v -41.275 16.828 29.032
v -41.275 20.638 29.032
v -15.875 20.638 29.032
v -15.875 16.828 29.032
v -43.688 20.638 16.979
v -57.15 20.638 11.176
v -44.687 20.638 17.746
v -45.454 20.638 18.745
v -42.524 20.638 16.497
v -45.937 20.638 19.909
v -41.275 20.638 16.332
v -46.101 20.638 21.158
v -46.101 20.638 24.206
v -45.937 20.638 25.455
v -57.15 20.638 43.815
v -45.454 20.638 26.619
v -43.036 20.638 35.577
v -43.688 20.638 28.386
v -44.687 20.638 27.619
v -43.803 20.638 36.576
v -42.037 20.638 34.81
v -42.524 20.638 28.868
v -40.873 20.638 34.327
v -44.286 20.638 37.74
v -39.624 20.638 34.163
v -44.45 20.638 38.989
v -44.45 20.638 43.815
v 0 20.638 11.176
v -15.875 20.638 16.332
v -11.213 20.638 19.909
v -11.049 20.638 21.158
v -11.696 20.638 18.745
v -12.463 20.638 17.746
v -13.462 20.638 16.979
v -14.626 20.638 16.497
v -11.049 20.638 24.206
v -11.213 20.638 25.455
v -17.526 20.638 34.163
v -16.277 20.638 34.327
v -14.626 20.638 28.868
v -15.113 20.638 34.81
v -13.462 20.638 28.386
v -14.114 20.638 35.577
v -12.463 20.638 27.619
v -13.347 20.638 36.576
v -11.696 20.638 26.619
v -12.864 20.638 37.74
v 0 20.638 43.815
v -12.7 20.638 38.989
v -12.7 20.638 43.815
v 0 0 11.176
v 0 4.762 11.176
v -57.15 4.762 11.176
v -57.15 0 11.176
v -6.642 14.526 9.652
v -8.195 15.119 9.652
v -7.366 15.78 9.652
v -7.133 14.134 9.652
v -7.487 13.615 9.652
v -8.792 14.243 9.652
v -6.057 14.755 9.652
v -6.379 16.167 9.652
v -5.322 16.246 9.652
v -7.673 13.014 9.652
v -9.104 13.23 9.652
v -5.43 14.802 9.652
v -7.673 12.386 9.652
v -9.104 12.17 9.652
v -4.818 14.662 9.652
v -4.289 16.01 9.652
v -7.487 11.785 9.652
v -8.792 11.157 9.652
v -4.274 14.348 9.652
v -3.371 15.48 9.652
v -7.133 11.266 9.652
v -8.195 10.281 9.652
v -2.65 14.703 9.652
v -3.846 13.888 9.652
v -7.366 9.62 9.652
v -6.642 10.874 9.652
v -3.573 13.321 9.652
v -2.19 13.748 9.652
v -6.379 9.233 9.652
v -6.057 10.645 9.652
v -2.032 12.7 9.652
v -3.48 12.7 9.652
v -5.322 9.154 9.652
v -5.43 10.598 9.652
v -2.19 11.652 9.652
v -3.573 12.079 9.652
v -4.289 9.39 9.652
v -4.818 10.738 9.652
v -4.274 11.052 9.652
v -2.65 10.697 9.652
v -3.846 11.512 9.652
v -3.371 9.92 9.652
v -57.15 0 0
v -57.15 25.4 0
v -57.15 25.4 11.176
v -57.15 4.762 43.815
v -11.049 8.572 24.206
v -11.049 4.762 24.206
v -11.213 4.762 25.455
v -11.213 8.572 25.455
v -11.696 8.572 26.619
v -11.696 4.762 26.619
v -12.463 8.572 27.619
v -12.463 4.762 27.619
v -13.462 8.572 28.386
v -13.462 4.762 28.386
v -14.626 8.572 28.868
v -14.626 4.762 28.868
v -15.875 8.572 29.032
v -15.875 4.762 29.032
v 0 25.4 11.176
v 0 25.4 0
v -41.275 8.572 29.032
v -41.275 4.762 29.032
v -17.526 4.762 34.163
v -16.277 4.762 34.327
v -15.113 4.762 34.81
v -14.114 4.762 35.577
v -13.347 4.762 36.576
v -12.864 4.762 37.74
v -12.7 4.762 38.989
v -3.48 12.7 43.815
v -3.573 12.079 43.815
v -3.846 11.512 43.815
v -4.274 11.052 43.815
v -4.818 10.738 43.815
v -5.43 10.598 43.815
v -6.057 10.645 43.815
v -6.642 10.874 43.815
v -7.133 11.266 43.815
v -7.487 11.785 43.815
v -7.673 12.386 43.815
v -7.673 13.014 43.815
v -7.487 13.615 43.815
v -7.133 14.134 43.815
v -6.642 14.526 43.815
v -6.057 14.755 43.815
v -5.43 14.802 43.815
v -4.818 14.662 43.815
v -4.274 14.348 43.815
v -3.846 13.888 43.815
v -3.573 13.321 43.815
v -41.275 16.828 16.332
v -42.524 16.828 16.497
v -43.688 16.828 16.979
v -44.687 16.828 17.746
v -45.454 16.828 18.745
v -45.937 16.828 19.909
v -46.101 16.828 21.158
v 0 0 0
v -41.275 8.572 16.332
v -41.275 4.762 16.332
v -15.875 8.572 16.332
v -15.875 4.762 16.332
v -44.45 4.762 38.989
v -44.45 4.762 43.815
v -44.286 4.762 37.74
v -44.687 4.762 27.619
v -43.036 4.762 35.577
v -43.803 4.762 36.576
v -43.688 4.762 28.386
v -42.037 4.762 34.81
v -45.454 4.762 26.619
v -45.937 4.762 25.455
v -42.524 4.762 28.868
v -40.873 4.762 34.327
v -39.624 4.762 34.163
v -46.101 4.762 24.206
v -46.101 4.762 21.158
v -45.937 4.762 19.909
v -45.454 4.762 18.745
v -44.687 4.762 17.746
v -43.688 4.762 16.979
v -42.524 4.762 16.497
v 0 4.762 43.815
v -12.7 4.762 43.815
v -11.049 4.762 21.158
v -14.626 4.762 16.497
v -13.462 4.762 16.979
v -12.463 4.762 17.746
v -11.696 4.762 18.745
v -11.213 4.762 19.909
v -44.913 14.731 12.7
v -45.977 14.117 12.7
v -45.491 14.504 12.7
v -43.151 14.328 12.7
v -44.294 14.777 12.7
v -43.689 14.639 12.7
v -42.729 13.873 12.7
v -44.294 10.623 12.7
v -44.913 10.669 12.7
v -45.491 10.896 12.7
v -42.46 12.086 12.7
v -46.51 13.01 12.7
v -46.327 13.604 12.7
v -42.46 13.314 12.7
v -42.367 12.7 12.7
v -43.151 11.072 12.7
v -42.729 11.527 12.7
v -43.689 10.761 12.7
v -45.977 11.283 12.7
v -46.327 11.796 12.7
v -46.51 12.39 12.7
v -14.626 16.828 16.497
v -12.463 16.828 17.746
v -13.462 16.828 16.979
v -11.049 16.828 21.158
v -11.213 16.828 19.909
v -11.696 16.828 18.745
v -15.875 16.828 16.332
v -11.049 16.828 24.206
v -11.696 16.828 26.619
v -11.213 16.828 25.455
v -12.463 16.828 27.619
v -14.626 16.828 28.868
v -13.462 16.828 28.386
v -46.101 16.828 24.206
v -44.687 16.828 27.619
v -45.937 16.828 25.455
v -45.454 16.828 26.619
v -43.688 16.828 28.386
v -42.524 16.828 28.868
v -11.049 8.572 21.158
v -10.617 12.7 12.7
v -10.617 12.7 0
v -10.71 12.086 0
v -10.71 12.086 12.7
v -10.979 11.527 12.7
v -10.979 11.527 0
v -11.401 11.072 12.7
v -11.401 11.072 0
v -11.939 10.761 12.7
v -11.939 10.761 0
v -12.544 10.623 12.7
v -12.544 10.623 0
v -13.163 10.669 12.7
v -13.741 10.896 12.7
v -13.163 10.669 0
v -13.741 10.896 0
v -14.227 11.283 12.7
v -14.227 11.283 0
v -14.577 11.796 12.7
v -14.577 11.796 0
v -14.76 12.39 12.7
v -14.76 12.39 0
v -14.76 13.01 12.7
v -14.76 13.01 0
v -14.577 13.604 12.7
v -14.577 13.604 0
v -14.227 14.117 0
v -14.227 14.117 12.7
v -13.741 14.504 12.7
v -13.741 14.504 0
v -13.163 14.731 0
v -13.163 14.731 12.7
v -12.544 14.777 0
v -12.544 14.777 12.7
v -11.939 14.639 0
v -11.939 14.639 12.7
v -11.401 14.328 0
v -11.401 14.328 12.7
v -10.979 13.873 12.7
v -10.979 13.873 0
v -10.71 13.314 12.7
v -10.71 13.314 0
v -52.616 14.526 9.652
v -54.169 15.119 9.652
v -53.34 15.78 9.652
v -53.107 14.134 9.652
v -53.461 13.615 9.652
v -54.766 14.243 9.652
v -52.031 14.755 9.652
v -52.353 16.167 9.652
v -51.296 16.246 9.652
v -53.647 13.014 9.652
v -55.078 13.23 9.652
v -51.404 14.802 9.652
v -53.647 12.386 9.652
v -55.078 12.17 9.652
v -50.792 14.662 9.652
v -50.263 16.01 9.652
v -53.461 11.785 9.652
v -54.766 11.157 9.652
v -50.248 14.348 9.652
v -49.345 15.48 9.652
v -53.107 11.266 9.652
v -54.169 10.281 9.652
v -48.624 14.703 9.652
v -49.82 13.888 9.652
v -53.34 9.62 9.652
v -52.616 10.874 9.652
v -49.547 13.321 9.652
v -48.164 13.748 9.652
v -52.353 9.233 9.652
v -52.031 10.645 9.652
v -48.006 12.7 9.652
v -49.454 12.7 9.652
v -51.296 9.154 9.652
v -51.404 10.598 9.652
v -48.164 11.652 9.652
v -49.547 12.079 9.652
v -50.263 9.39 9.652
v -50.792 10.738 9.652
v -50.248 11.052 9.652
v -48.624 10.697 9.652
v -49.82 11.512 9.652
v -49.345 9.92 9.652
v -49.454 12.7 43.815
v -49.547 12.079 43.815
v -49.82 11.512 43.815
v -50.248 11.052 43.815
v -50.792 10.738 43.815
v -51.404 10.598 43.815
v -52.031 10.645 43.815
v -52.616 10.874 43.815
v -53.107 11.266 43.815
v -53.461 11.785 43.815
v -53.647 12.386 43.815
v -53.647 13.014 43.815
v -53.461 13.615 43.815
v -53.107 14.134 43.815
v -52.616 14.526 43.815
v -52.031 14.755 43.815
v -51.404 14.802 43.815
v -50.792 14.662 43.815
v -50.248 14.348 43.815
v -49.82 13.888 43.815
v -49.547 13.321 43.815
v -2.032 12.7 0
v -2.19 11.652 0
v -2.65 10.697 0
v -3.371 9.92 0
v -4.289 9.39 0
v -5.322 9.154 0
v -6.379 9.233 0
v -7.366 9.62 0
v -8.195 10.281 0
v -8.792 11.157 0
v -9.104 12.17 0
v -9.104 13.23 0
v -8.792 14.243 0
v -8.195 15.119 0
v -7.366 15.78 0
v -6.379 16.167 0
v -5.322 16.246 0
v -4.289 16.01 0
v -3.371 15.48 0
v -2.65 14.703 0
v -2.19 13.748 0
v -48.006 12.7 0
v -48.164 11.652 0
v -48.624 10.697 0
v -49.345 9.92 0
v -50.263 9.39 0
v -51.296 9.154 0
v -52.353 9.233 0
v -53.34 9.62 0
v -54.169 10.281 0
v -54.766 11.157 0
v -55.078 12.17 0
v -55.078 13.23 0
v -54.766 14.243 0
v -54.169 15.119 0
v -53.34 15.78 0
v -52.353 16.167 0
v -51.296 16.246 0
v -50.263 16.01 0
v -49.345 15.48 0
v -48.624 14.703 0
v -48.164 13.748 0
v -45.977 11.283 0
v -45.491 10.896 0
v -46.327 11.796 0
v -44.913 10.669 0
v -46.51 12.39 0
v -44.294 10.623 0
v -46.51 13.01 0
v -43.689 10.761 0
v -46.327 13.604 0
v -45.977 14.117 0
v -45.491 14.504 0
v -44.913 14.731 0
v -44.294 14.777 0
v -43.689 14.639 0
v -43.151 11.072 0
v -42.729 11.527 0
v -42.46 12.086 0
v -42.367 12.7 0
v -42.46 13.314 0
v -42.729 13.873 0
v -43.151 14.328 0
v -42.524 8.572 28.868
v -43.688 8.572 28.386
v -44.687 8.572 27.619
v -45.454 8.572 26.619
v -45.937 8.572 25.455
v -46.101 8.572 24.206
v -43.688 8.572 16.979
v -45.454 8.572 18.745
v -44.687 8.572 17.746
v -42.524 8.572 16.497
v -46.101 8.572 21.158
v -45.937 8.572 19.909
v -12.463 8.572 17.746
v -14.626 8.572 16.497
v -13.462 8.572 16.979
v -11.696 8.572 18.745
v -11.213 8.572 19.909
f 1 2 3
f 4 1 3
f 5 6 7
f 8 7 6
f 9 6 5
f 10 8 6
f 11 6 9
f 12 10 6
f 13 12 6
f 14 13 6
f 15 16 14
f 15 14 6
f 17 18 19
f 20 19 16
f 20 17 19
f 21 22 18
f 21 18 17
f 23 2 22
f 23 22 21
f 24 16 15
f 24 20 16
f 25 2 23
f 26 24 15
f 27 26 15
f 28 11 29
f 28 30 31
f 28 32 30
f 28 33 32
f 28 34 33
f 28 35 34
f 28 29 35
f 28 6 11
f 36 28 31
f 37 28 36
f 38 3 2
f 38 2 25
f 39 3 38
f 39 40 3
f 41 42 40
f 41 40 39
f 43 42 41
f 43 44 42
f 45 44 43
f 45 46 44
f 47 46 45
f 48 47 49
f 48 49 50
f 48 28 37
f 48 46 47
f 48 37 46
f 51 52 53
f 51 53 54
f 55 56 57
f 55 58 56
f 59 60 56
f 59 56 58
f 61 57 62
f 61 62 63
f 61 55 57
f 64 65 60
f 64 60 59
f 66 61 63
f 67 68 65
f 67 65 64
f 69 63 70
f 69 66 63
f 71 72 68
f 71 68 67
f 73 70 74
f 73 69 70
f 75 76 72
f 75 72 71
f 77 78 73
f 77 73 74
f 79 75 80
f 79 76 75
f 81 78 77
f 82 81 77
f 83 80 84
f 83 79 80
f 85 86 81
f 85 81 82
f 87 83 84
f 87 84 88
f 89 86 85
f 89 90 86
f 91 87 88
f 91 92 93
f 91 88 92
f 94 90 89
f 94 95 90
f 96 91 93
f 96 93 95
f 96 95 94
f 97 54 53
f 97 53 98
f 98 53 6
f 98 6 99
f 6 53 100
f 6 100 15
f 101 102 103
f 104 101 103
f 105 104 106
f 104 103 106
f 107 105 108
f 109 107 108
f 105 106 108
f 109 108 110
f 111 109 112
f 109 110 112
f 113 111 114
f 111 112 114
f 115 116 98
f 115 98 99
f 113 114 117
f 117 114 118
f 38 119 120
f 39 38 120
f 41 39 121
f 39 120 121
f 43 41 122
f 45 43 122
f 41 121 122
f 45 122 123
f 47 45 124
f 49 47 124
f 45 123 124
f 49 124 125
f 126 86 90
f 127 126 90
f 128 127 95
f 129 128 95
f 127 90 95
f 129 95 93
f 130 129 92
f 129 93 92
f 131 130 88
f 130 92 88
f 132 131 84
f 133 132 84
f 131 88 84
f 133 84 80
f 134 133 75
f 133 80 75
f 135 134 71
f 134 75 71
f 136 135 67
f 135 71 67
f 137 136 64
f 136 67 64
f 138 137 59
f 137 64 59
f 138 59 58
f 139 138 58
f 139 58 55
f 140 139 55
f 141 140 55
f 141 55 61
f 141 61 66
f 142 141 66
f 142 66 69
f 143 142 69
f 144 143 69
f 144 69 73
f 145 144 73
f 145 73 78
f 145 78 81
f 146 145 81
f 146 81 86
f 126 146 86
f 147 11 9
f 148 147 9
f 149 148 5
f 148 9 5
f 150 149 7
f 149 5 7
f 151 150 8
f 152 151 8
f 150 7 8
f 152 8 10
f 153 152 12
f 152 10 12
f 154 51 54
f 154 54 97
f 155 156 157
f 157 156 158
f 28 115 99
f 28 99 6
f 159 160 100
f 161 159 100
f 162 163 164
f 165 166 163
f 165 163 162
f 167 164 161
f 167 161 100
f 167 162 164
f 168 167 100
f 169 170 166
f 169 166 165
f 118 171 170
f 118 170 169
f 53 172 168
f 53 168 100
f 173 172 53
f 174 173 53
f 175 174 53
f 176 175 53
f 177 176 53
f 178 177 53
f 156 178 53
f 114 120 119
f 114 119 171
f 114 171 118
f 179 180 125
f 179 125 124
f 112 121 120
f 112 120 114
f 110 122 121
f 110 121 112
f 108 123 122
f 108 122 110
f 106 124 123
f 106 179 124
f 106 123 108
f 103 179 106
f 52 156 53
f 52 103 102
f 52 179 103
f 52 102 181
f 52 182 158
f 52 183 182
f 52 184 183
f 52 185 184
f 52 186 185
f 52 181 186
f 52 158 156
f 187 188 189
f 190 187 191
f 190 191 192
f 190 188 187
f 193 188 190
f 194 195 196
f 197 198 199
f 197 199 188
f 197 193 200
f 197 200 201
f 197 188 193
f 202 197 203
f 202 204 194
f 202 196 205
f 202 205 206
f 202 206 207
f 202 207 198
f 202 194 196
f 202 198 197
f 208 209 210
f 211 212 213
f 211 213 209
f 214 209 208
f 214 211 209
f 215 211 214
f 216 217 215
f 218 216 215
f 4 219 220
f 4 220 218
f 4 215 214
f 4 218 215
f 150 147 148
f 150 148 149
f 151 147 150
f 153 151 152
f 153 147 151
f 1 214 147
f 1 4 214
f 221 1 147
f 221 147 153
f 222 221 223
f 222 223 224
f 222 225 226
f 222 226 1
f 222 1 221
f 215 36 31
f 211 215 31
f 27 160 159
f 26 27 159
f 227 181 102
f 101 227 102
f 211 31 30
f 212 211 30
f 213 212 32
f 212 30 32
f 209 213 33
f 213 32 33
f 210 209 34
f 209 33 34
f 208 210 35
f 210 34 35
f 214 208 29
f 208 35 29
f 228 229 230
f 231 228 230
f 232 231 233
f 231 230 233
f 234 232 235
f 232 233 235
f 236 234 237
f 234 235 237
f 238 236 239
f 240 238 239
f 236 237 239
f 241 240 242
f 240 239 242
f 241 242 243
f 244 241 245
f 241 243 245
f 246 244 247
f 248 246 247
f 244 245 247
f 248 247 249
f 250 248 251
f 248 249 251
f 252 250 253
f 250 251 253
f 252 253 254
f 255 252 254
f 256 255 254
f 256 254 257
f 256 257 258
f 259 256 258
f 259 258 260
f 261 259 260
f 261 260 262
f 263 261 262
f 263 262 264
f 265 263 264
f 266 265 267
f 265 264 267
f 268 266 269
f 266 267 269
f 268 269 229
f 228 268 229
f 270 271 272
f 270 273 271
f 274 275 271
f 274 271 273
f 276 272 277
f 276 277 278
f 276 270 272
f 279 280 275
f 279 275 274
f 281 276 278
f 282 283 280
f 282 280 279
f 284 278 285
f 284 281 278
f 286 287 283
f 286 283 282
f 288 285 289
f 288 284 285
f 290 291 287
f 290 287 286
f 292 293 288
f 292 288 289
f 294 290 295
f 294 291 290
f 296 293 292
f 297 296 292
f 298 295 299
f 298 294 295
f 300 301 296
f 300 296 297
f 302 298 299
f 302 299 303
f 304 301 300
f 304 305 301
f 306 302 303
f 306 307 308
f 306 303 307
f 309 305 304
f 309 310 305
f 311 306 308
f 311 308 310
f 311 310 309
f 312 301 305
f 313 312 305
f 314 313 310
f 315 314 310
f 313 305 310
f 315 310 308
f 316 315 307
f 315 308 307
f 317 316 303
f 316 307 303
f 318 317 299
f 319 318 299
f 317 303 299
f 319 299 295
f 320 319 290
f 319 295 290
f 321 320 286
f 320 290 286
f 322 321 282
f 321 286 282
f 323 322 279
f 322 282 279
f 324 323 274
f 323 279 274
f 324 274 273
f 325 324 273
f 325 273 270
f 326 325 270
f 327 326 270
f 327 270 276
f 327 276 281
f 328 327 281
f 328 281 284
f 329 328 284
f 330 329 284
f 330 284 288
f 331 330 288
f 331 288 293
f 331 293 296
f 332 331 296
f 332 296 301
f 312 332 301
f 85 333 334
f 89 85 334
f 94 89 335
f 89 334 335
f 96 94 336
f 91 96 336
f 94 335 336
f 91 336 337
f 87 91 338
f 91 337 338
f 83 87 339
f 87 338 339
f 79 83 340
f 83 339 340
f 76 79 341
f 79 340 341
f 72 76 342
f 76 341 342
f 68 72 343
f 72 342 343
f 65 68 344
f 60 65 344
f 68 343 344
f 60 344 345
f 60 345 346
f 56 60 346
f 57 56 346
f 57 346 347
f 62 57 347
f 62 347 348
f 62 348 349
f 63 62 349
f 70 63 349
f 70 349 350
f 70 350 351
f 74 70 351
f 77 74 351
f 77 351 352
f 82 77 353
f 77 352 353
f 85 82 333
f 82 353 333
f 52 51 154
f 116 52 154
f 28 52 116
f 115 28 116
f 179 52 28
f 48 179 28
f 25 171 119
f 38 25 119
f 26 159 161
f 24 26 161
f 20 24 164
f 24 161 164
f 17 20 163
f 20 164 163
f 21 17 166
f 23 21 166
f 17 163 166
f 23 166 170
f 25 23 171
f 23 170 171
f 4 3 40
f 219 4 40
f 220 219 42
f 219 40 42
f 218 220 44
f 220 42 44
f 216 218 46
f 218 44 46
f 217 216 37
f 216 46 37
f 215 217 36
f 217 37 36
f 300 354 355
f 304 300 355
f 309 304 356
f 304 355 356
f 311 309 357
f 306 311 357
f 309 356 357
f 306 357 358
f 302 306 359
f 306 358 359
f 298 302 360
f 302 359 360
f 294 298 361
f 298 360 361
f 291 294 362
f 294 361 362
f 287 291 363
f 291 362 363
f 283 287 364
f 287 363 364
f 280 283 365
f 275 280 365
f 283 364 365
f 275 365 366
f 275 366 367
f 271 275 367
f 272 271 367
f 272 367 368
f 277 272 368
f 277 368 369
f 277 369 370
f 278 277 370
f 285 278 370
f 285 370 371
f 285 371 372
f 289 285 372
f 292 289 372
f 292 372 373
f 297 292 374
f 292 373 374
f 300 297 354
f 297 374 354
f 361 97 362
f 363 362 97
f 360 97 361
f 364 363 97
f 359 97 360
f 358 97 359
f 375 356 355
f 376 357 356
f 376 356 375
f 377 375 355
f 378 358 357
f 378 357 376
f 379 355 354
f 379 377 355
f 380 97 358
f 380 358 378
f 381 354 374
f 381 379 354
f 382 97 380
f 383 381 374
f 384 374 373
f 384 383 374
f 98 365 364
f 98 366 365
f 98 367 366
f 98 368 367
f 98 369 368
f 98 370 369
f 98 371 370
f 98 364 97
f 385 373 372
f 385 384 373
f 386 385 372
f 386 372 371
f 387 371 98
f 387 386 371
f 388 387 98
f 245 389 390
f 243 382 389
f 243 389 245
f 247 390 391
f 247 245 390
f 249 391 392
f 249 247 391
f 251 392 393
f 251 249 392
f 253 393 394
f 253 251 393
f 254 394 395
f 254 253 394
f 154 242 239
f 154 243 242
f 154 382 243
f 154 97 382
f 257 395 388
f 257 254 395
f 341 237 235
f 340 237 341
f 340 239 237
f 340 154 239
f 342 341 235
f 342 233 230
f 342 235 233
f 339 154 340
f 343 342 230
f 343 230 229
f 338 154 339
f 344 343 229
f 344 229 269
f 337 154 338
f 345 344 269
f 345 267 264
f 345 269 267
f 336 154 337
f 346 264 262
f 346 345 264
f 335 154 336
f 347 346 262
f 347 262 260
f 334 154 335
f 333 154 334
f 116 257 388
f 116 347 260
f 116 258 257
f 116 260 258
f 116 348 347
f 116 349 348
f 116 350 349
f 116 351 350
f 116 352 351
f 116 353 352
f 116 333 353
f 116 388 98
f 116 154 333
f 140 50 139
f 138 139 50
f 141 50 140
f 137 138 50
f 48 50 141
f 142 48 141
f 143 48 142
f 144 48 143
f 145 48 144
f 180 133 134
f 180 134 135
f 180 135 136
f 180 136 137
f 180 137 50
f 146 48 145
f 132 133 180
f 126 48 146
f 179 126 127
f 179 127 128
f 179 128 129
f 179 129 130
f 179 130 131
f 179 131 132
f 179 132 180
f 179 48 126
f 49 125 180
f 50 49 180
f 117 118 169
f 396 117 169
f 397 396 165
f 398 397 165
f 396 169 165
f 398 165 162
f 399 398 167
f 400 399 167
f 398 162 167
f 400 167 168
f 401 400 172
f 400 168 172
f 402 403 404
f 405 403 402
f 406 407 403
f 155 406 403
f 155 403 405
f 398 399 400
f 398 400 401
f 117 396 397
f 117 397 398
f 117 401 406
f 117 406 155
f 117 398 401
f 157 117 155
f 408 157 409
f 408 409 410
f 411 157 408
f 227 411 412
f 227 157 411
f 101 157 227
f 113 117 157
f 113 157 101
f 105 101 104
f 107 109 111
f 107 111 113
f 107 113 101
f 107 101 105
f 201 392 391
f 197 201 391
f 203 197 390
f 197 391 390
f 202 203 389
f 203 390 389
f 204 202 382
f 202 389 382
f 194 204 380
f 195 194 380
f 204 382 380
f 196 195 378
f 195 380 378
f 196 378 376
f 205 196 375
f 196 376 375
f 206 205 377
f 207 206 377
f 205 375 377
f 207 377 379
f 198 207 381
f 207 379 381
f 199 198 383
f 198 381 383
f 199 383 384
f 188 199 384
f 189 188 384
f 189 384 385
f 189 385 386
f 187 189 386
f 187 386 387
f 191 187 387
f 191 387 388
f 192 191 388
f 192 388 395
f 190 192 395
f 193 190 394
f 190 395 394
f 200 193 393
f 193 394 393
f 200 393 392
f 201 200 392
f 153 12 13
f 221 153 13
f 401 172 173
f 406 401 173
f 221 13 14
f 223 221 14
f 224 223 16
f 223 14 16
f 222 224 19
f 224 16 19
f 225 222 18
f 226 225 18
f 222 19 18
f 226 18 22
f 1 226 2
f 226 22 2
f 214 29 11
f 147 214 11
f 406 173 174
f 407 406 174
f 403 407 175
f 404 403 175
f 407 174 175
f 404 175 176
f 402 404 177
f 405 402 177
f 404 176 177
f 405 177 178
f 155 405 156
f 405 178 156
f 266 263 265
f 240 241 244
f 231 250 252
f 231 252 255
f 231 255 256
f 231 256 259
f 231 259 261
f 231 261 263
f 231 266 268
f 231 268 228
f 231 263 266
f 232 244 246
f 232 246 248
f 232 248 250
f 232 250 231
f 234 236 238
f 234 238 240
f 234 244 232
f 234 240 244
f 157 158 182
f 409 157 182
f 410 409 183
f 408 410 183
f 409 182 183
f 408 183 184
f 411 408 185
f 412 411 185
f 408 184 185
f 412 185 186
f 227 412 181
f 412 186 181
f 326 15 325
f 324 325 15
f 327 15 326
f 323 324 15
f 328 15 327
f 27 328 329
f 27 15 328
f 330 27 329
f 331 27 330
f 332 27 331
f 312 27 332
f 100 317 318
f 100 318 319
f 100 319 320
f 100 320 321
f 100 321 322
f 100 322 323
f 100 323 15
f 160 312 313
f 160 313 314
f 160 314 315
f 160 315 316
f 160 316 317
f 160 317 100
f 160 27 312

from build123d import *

# Parameters (mm, degrees)
F1_DEPTH  = 57.15
F3_DEPTH  = 25.4
F5_DEPTH  = 3.81
F7_DEPTH  = 3.81
F8_R      = 2.0828
F9_DEPTH  = 12.7
F8_R_2    = 2.1082
F10_DEPTH = 43.816
F8_R_3    = 3.556
F11_DEPTH = 9.652


with BuildPart() as f1:
    # F0 (on Right) → F1 (new body)
    with BuildSketch(Plane.YZ):
        Polygon((0, 11.176), (0, 0), (25.4, 0), (25.4, 11.176), (20.6375, 11.176), (20.6375, 43.815), (4.7625, 43.815), (4.7625, 11.176), align=None)
    extrude(amount=-F1_DEPTH)

    # F2 (on face) → F3 (cut)
    with BuildSketch(Plane.XZ.offset(-4.7625)):
        with BuildLine():
            Line((-12.7, 43.815), (-44.45, 43.815))
            Line((-44.45, 43.815), (-44.45, 38.989))
            ThreePointArc((-44.45, 38.989), (-43.036497, 35.576503), (-39.624, 34.163))
            Line((-39.624, 34.163), (-17.526, 34.163))
            ThreePointArc((-17.526, 34.163), (-14.113503, 35.576503), (-12.7, 38.989))
            Line((-12.7, 38.989), (-12.7, 43.815))
        make_face()
    extrude(amount=-F3_DEPTH, mode=Mode.SUBTRACT)

    # F4 (on face) → F5 (cut)
    with BuildSketch(Plane.XZ.offset(-4.7625)):
        with BuildLine():
            Line((-15.875, 29.0322), (-41.275, 29.0322))
            ThreePointArc((-41.275, 29.0322), (-44.687497, 27.618697), (-46.101, 24.2062))
            Line((-46.101, 24.2062), (-46.101, 21.1582))
            ThreePointArc((-46.101, 21.1582), (-44.687497, 17.745703), (-41.275, 16.3322))
            Line((-41.275, 16.3322), (-15.875, 16.3322))
            ThreePointArc((-15.875, 16.3322), (-12.462503, 17.745703), (-11.049, 21.1582))
            Line((-11.049, 21.1582), (-11.049, 24.2062))
            ThreePointArc((-11.049, 24.2062), (-12.462503, 27.618697), (-15.875, 29.0322))
        make_face()
    extrude(amount=-F5_DEPTH, mode=Mode.SUBTRACT)

    # F6 (on face) → F7 (cut)
    with BuildSketch(Plane(origin=(0, 20.6375, 0), x_dir=(-1, 0, 0), z_dir=(0, 1, 0))):
        with BuildLine():
            Line((41.275, 29.0322), (15.875, 29.0322))
            ThreePointArc((15.875, 29.0322), (12.462503, 27.618697), (11.049, 24.2062))
            Line((11.049, 24.2062), (11.049, 21.1582))
            ThreePointArc((11.049, 21.1582), (12.462503, 17.745703), (15.875, 16.3322))
            Line((15.875, 16.3322), (41.275, 16.3322))
            ThreePointArc((41.275, 16.3322), (44.687497, 17.745703), (46.101, 21.1582))
            Line((46.101, 21.1582), (46.101, 24.2062))
            ThreePointArc((46.101, 24.2062), (44.687497, 27.618697), (41.275, 29.0322))
        make_face()
    extrude(amount=-F7_DEPTH, mode=Mode.SUBTRACT)

    # F8 (on face) → F9 (cut)
    with BuildSketch(Plane(origin=(0, 0, 0), x_dir=(1, 0, 0), z_dir=(0, 0, -1))):
        with Locations((-44.45, -12.7)):
            Circle(F8_R)
        with Locations((-12.7, -12.7)):
            Circle(F8_R)
    extrude(amount=-F9_DEPTH, mode=Mode.SUBTRACT)

    # F8 (on face) → F10 (cut, through all)
    with BuildSketch(Plane(origin=(0, 0, 0), x_dir=(1, 0, 0), z_dir=(0, 0, -1))):
        with Locations((-51.562, -12.7)):
            Circle(F8_R_2)
        with Locations((-5.588, -12.7)):
            Circle(F8_R_2)
    extrude(amount=-F10_DEPTH, mode=Mode.SUBTRACT)

    # F8 (on face) → F11 (cut)
    with BuildSketch(Plane(origin=(0, 0, 0), x_dir=(1, 0, 0), z_dir=(0, 0, -1))):
        with Locations((-51.562, -12.7)):
            Circle(F8_R_3)
        with Locations((-51.562, -12.7)):
            Circle(F8_R_2, mode=Mode.SUBTRACT)
        with Locations((-5.588, -12.7)):
            Circle(F8_R_3)
        with Locations((-5.588, -12.7)):
            Circle(F8_R_2, mode=Mode.SUBTRACT)
    extrude(amount=-F11_DEPTH, mode=Mode.SUBTRACT)


solid = f1.part
